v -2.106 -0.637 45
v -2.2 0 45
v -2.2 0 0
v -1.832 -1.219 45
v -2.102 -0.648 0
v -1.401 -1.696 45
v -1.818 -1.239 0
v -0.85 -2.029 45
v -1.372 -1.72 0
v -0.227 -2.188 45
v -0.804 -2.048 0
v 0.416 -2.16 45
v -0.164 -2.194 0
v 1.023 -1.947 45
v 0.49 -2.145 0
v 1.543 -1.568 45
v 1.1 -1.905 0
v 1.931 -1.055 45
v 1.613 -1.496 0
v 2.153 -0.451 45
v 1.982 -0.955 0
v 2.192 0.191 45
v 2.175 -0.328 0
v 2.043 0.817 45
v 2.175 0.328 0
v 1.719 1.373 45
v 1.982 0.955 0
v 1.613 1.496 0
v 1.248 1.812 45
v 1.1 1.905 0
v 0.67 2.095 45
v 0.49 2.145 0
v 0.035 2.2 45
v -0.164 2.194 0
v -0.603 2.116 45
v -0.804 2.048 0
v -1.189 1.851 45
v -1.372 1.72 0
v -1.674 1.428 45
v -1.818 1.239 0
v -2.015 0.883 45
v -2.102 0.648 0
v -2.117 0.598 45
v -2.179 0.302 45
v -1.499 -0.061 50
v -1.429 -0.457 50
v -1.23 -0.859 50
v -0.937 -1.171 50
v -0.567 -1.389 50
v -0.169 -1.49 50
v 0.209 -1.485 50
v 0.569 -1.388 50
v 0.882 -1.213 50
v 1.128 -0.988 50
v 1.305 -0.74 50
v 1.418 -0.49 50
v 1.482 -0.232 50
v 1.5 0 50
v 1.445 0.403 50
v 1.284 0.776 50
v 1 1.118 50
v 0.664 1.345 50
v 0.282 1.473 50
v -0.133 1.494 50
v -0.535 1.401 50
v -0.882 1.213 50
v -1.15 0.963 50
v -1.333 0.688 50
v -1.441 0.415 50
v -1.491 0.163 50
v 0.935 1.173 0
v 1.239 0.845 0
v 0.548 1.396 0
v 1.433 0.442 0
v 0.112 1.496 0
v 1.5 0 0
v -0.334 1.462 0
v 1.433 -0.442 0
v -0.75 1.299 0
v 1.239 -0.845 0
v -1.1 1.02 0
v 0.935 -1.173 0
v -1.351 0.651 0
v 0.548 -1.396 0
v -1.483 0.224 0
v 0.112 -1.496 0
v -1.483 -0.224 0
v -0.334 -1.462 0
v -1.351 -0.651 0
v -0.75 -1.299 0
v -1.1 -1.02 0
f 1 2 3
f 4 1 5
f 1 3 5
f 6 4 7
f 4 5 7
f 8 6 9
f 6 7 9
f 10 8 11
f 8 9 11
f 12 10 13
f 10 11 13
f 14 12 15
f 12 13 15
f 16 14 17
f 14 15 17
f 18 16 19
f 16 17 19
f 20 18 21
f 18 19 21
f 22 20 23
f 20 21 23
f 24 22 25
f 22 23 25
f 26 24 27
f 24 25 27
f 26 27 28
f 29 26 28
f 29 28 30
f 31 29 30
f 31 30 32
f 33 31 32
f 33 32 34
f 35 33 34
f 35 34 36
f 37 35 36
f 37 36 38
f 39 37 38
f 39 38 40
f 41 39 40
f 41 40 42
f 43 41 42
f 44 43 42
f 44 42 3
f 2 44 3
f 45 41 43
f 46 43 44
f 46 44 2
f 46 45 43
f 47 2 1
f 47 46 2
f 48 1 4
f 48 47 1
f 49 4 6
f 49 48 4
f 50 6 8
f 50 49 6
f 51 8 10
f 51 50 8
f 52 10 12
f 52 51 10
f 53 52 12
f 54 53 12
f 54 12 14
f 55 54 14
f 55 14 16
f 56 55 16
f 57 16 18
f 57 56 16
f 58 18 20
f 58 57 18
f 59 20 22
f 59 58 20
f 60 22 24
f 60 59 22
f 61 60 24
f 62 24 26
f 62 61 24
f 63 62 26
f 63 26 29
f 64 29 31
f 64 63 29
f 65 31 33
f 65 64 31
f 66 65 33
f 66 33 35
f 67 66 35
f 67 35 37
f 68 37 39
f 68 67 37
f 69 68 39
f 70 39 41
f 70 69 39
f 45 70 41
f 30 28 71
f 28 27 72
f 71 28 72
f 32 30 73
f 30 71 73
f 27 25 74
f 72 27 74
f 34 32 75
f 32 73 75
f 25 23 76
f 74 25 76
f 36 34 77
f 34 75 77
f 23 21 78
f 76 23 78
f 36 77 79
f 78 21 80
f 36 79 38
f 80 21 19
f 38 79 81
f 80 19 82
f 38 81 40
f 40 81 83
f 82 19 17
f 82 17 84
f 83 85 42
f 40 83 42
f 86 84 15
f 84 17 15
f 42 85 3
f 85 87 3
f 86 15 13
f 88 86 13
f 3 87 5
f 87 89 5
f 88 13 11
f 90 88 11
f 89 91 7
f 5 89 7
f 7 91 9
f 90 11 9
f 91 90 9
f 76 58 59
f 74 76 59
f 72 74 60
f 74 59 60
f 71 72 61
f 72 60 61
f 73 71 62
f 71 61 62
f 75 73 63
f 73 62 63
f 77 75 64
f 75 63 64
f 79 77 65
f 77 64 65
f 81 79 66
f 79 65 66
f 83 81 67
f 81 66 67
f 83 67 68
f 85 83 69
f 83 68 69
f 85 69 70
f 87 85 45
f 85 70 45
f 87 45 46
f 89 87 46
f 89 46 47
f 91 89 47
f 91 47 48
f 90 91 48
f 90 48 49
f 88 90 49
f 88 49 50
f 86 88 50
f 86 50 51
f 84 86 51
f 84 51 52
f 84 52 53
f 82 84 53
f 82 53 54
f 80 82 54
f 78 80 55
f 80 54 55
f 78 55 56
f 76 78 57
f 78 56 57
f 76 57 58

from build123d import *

# Parameters (mm, degrees)
SKETCH1_R           = 2.2
BOSS_EXTRUDE1_DEPTH = 45
SKETCH4_R           = 1.5
CUT_EXTRUDE1_DEPTH  = 51.096706487


with BuildPart() as part:
    # Sketch1 → Boss-Extrude1 (new body)
    with BuildSketch(Plane.XY):
        with Locations(Location((0, 0, 0), (0, 0, 180))):
            Circle(SKETCH1_R)
    extrude(amount=BOSS_EXTRUDE1_DEPTH)

    # Loft1: read off the stored shape, not the designer's step
    # Loft1: loft between two sections, ruled curve by curve
    loft1_from = [
        Edge.make_bspline([(-2.015197815, 0.88259717, 45), (-3.780392156, -3.14779846, 45), (0.250003475, -4.912992801, 45), (2.015197815, -0.88259717, 45), (3.780392156, 3.14779846, 45), (-0.250003475, 4.912992801, 45), (-2.015197815, 0.88259717, 45)], [0, 0, 0, 0, 0.5, 0.5, 0.5, 1, 1, 1, 1], 3, [1, 0.333333333, 0.333333333, 1, 0.333333333, 0.333333333, 1]),
    ]
    loft1_to = [
        Edge.make_bspline([(-1.498749202, -0.061244028, 50), (-1.376261146, -3.058742431, 50), (1.621237257, -2.936254375, 50), (1.498749202, 0.061244028, 50), (1.376261146, 3.058742431, 50), (-1.621237257, 2.936254375, 50), (-1.498749202, -0.061244028, 50)], [0, 0, 0, 0, 0.5, 0.5, 0.5, 1, 1, 1, 1], 3, [1, 0.333333333, 0.333333333, 1, 0.333333333, 0.333333333, 1]),
    ]
    loft1 = Solid(Shell([*[Face.make_surface_from_curves(loft1_from[k], loft1_to[k]) for k in range(1)], Face(Wire(loft1_from)), Face(Wire(loft1_to))]))
    add(loft1)

    # Sketch4 → Cut-Extrude1 (cut, through all)
    with BuildSketch(Plane.XY.offset(50)):
        Circle(SKETCH4_R)
    extrude(amount=-CUT_EXTRUDE1_DEPTH, mode=Mode.SUBTRACT)


solid = part.part
